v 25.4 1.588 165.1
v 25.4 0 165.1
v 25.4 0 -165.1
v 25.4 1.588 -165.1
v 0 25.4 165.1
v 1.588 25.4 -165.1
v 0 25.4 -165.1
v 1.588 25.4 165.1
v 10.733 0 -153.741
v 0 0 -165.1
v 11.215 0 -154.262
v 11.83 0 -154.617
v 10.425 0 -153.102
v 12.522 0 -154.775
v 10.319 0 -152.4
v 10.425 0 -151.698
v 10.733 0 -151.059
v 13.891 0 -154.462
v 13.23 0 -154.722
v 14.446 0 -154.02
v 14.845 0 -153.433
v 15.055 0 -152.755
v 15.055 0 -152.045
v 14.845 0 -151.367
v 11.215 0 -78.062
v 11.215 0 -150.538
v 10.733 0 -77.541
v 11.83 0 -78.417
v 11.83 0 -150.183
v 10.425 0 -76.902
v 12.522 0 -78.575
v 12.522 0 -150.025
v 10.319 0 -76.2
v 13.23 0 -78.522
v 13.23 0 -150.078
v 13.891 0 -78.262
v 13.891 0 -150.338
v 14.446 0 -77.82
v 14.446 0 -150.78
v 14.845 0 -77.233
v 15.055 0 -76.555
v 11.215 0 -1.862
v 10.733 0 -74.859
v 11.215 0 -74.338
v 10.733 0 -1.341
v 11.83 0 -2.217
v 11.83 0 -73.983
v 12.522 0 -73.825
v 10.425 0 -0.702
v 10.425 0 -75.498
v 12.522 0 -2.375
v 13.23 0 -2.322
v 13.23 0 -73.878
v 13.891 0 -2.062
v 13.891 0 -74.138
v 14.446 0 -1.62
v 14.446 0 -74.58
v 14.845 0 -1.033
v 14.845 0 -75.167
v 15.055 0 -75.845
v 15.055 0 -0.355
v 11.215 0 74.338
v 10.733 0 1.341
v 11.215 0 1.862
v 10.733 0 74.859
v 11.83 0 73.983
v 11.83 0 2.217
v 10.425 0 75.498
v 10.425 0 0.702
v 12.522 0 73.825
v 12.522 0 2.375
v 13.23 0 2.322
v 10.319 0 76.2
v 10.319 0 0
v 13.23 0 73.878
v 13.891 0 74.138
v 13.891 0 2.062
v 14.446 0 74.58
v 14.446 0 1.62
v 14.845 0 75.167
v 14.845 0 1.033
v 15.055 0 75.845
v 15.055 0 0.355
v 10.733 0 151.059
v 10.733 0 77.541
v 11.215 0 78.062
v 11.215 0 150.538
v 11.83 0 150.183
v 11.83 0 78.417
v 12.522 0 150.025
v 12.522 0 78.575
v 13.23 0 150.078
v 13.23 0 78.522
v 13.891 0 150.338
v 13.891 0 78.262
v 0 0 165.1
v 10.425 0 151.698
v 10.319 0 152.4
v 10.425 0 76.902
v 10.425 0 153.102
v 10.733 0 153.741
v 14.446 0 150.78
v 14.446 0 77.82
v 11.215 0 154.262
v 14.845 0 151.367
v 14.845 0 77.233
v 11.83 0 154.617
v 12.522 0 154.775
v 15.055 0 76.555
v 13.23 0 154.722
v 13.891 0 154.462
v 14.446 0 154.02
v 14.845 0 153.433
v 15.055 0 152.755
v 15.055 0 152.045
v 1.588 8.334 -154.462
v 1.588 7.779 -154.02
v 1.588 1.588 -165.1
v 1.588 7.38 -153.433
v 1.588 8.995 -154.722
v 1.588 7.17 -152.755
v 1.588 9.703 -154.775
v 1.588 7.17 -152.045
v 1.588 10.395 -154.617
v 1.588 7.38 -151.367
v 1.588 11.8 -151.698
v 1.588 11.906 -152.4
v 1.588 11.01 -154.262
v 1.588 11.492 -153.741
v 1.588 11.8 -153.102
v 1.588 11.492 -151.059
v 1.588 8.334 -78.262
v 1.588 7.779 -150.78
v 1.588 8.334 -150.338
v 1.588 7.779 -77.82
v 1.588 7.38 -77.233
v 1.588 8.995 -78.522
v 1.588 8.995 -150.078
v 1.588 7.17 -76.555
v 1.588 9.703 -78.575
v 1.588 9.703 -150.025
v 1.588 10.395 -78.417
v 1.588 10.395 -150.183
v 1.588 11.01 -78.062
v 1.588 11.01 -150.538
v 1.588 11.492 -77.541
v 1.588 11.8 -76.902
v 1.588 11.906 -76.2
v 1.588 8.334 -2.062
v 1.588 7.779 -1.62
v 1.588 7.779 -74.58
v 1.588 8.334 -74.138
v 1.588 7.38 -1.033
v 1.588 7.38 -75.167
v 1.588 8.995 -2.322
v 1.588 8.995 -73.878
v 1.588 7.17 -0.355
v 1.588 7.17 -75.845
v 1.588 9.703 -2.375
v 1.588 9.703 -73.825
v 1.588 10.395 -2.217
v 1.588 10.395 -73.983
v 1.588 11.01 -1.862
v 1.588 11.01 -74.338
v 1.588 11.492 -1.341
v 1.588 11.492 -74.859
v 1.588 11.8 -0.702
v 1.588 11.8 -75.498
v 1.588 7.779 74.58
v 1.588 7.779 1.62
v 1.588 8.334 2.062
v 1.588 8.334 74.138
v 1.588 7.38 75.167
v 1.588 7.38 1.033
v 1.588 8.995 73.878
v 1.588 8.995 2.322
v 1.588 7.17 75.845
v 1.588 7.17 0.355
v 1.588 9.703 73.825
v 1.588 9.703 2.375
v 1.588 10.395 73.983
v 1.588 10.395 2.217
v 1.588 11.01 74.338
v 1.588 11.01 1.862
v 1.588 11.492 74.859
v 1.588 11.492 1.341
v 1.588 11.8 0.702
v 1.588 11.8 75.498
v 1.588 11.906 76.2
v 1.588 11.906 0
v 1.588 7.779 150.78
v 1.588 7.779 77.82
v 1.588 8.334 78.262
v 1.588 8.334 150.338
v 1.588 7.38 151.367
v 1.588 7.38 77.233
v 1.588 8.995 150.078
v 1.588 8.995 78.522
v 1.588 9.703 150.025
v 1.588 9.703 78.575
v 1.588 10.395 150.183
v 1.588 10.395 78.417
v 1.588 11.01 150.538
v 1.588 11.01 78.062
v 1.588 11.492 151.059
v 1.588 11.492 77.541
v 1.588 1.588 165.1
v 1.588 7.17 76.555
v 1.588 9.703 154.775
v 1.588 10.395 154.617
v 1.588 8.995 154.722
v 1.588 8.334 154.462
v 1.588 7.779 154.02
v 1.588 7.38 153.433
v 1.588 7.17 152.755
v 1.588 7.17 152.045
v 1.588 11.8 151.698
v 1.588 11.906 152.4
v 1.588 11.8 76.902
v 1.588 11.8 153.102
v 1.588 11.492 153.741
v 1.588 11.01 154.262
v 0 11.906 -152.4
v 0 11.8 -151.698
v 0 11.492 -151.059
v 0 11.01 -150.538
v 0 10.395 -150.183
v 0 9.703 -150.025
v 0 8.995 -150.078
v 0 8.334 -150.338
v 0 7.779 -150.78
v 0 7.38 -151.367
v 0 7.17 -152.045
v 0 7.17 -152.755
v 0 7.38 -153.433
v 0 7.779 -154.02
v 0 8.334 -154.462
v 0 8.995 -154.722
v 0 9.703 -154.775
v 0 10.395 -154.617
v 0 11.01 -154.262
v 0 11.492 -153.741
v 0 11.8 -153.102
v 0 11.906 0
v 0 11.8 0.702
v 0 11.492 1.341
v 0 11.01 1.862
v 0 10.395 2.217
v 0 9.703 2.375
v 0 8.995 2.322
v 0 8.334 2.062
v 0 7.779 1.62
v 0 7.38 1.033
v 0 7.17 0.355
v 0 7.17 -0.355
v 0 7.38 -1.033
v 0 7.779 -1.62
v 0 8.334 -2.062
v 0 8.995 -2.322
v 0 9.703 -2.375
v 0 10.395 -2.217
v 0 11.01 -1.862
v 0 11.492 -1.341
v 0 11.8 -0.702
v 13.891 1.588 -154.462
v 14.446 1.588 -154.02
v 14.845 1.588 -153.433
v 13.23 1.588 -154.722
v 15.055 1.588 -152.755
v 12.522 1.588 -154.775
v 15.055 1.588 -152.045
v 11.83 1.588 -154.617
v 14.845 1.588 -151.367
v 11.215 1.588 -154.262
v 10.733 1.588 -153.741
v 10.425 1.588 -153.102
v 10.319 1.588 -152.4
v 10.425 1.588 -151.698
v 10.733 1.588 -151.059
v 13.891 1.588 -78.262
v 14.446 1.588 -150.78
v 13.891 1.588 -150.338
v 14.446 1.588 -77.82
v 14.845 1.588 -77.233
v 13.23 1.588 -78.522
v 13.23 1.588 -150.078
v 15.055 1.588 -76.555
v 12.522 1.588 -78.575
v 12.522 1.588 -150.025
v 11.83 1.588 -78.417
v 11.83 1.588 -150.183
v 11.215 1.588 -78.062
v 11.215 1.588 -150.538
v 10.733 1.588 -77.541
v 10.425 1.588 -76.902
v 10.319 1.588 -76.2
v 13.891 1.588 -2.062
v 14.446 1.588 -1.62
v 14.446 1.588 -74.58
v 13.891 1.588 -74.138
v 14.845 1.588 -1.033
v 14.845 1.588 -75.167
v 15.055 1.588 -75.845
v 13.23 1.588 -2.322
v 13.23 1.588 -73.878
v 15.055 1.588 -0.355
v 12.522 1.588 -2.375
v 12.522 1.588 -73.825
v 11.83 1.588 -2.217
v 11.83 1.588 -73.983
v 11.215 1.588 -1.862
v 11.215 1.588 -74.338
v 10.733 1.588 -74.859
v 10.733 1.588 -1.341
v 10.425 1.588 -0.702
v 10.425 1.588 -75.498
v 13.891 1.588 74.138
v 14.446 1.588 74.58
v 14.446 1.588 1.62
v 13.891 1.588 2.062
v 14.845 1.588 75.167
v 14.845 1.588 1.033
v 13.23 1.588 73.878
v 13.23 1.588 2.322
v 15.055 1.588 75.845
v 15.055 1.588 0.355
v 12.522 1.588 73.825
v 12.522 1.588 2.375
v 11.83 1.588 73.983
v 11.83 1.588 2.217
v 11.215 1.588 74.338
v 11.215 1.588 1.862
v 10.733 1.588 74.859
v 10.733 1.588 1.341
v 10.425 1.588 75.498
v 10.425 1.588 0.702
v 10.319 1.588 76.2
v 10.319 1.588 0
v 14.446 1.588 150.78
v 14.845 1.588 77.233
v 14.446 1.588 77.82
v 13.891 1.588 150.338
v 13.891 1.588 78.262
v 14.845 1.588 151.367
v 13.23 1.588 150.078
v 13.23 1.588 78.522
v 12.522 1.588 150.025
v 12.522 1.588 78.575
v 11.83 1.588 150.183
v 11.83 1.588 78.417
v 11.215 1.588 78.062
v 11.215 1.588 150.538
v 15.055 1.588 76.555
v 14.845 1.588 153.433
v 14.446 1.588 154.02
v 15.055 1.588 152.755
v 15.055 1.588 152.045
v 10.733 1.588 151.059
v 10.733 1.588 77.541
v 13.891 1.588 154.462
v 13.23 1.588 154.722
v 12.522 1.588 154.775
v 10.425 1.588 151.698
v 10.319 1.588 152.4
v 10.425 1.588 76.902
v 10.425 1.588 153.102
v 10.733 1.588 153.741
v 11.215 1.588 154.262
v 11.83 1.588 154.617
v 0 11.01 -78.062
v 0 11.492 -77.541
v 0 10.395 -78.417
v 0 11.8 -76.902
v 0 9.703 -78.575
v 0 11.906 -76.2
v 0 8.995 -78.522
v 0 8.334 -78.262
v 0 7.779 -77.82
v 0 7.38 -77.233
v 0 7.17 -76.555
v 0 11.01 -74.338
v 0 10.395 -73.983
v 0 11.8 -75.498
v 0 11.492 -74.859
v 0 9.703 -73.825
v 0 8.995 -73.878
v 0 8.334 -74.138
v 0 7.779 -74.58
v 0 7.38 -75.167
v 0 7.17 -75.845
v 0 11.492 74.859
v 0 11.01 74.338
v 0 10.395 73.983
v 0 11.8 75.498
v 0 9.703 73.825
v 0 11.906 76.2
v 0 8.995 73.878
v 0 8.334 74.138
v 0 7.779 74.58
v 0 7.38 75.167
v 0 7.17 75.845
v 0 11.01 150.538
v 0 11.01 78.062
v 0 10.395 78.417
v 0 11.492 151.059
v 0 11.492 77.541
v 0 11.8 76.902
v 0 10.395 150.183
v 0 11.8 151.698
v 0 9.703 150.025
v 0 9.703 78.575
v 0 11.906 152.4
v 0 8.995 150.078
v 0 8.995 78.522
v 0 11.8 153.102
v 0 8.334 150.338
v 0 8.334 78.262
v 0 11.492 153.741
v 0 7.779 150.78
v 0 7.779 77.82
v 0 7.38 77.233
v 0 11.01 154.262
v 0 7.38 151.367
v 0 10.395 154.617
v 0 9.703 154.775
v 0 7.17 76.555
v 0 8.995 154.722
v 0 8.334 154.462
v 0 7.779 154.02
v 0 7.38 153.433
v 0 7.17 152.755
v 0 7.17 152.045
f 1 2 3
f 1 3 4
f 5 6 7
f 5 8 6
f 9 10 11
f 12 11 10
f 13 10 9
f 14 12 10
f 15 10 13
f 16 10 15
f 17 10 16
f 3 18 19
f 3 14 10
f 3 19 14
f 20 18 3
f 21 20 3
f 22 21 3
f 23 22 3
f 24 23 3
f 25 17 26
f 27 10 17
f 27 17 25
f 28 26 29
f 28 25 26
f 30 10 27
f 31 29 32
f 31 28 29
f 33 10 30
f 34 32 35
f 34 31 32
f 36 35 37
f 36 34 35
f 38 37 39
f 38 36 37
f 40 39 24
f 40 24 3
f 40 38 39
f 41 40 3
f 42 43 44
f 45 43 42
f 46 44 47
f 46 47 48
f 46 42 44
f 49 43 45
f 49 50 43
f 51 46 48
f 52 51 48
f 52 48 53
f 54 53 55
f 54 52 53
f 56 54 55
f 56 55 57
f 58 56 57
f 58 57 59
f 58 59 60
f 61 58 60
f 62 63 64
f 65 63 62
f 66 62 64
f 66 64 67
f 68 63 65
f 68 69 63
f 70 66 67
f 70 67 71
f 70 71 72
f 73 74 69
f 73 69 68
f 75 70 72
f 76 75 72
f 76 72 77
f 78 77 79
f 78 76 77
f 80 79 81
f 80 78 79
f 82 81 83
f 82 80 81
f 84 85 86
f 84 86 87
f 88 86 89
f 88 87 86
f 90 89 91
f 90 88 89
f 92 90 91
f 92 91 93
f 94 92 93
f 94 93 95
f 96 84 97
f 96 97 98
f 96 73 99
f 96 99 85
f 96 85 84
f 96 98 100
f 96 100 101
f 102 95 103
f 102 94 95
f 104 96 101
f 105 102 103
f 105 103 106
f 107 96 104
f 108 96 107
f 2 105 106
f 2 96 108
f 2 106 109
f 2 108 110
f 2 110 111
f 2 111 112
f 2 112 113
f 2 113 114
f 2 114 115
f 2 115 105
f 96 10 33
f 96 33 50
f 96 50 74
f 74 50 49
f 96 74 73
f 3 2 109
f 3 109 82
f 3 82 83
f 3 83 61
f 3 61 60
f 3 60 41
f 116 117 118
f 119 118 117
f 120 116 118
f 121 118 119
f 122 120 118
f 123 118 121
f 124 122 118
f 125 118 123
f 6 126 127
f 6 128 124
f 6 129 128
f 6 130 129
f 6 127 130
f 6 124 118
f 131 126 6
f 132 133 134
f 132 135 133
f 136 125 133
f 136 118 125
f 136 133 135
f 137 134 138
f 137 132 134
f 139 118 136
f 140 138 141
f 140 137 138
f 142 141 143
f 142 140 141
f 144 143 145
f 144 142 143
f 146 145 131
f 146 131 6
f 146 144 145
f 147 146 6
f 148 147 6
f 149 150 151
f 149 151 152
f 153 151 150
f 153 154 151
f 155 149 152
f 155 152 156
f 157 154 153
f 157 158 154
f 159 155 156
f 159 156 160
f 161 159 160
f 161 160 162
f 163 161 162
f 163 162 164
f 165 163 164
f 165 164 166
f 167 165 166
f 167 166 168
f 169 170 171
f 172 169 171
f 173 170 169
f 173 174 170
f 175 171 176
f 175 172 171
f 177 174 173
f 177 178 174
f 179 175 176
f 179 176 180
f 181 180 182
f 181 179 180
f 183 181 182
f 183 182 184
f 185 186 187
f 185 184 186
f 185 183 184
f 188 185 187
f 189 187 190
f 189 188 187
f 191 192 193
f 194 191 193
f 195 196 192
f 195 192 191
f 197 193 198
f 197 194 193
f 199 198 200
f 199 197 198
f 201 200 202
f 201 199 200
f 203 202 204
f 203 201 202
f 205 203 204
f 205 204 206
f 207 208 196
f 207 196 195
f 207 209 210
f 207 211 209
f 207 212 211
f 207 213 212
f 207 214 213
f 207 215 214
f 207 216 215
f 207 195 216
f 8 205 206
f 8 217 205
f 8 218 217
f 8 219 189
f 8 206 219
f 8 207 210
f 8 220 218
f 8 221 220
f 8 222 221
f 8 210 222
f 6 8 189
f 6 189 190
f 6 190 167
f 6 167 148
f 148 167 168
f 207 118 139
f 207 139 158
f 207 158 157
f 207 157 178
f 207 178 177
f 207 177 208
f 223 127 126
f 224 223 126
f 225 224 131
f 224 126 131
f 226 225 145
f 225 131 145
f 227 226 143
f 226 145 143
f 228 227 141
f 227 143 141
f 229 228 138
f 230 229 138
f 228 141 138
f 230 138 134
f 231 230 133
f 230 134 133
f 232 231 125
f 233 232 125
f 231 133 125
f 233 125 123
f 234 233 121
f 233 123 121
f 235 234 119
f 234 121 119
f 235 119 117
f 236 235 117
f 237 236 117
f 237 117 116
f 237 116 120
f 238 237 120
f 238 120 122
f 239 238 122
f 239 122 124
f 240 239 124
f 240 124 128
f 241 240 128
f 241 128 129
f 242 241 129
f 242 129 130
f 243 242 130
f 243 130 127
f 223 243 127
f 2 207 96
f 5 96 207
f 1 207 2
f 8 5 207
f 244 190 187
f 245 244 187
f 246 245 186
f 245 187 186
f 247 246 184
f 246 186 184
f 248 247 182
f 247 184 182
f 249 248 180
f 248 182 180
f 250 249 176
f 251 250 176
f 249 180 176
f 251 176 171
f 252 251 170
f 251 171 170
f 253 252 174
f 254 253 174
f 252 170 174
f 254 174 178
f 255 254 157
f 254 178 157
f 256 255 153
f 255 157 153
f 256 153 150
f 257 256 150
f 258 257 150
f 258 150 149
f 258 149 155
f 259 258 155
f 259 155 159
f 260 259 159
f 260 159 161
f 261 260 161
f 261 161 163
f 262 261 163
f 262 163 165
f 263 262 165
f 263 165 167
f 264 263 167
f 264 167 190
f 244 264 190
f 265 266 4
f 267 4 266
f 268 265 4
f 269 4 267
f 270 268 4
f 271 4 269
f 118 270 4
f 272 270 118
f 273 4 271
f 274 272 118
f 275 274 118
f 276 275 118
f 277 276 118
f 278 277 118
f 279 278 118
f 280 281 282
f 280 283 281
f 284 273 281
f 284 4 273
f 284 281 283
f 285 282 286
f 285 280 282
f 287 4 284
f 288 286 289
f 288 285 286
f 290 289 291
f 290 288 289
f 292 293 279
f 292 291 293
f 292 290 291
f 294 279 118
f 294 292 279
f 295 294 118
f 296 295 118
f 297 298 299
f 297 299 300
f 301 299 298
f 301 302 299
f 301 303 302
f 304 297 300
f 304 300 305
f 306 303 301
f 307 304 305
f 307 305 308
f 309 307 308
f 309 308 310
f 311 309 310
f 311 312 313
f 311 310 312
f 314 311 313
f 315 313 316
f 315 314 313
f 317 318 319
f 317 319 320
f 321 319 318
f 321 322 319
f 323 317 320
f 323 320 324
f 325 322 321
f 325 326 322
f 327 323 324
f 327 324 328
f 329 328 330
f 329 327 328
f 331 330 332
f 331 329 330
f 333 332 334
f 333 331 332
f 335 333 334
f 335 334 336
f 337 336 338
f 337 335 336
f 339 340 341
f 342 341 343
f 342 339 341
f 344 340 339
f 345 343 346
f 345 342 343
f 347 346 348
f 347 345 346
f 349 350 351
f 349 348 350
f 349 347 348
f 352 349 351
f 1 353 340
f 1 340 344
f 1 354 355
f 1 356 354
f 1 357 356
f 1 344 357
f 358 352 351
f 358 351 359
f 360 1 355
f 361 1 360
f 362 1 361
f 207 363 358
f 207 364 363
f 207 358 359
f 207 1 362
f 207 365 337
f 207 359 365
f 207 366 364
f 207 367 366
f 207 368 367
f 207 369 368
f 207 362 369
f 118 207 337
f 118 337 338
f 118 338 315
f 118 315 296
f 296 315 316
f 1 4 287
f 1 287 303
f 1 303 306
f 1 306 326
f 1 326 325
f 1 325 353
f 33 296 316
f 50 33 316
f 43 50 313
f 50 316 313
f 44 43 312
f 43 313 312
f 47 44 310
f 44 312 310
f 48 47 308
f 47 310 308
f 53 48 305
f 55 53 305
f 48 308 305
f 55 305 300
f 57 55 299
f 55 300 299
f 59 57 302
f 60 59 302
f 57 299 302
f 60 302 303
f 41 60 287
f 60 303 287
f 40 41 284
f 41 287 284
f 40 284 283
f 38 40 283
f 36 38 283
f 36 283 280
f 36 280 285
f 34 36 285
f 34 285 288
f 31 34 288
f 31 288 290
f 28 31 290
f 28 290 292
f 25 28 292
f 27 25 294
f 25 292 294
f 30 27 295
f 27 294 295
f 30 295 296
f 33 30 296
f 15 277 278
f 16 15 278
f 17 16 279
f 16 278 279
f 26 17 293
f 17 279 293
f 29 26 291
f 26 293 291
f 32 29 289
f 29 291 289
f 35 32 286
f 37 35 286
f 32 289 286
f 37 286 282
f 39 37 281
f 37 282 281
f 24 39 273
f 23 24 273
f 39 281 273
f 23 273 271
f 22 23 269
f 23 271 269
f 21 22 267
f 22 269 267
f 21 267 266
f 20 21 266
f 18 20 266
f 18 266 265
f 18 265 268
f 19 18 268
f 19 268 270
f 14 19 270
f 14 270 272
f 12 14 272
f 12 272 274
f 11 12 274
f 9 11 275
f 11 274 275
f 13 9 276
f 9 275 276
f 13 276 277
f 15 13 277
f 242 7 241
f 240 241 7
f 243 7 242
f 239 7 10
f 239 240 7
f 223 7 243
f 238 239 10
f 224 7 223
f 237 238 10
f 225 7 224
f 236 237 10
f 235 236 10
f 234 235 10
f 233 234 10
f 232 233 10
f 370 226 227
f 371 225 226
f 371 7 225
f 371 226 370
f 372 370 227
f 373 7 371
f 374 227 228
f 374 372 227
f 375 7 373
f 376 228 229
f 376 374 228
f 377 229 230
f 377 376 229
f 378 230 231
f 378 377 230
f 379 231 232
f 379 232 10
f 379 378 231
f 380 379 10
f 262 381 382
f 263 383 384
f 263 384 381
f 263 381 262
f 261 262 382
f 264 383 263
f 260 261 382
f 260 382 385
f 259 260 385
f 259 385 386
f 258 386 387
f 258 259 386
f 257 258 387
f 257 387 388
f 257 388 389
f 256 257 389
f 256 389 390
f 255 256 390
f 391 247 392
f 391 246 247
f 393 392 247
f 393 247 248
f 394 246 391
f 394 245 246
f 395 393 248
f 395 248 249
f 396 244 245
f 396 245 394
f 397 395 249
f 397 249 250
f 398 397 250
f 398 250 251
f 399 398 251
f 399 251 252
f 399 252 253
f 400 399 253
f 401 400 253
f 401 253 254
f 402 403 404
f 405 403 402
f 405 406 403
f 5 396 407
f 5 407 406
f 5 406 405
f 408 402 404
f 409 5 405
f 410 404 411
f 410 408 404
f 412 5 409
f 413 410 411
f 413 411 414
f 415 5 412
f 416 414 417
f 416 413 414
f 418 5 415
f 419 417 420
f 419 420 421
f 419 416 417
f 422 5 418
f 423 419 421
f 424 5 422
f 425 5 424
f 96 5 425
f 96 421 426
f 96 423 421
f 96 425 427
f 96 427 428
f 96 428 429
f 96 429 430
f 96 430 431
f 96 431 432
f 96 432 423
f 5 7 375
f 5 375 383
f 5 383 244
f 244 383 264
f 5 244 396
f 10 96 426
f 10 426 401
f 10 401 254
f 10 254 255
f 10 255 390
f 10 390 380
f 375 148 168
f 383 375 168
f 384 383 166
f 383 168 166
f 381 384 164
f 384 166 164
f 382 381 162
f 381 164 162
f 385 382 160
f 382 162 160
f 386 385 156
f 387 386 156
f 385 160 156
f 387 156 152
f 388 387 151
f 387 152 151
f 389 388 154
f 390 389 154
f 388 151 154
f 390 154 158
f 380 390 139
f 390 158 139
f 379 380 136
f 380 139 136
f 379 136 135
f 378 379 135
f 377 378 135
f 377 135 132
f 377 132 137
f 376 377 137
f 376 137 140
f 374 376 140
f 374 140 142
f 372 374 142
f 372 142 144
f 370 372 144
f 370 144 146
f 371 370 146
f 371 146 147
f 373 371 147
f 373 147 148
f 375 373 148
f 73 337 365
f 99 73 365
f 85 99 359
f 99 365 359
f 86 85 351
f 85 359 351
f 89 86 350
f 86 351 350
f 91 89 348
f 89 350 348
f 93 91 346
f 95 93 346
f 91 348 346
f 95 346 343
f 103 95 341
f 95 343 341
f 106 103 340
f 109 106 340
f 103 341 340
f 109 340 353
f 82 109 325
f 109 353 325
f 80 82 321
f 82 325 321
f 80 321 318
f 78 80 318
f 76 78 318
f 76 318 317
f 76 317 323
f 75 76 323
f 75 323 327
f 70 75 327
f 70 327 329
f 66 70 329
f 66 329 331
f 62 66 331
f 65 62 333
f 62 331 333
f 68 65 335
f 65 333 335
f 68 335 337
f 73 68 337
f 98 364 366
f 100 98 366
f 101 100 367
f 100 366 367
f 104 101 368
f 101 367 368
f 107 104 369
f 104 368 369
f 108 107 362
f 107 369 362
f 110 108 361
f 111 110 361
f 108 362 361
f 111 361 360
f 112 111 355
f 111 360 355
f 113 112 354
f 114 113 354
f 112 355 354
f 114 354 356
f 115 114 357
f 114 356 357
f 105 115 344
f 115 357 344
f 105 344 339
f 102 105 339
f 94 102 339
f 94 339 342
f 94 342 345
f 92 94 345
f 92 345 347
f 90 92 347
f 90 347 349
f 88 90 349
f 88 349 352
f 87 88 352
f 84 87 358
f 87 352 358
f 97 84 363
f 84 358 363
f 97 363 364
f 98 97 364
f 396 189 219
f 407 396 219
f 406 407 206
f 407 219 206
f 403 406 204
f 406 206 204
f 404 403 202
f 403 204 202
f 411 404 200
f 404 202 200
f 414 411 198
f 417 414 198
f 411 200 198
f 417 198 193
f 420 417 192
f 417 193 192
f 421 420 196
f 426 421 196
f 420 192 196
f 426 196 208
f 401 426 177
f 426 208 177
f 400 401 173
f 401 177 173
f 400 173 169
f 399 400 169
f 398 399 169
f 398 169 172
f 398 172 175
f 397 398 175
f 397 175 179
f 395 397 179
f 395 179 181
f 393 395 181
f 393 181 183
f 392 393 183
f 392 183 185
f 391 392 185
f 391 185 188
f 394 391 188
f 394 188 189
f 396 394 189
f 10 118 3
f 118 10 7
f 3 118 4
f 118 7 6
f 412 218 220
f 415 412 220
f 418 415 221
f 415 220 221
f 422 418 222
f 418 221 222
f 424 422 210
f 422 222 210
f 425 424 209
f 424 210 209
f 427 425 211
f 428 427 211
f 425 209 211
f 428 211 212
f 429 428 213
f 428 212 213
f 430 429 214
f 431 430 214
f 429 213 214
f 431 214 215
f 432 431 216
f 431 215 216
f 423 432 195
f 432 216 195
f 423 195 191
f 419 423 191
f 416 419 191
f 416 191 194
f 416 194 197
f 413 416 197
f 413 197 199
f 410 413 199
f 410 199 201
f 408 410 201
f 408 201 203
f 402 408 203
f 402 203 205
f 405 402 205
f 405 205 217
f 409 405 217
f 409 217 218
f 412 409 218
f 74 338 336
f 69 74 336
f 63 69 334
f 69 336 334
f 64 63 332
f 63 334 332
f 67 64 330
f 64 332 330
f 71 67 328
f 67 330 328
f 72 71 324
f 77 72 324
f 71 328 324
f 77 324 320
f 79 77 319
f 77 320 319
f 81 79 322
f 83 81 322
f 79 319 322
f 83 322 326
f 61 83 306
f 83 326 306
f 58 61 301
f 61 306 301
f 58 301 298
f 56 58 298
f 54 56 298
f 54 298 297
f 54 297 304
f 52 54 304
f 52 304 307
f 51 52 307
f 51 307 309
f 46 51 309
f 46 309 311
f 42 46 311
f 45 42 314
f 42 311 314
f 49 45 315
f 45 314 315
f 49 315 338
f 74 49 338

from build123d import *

# Parameters (mm, degrees)
F1_DEPTH = 165.1
F2_R     = 2.38125
F3_DEPTH = 1.5875
F4_R     = 2.38125
F5_DEPTH = 25.4


with BuildPart() as f1:
    # F0 (on Top) → F1 (new body, symmetric)
    with BuildSketch(Plane.XY):
        Polygon((1.5875, 25.4), (0, 25.4), (0, 0), (25.4, 0), (25.4, 1.5875), (1.5875, 1.5875), align=None)
    extrude(amount=F1_DEPTH, both=True)

    # F2 (on face) → F3 (cut, through all)
    with BuildSketch(Plane(origin=(0, 1.5875, 0), x_dir=(-1, 0, 0), z_dir=(0, 1, 0))):
        with Locations((-12.7, -152.4)):
            Circle(F2_R)
        with Locations((-12.7, 152.4)):
            Circle(F2_R)
        with Locations((-12.7, 76.2)):
            Circle(F2_R)
        with Locations((-12.7, -76.2)):
            Circle(F2_R)
        with Locations((-12.7, 0)):
            Circle(F2_R)
    extrude(amount=-F3_DEPTH, mode=Mode.SUBTRACT)

    # F4 (on face) → F5 (cut)
    with BuildSketch(Plane.YZ.offset(1.5875)):
        with Locations((9.525, -152.4)):
            Circle(F4_R)
        with Locations((9.525, -76.2)):
            Circle(F4_R)
        with Locations((9.525, 0)):
            Circle(F4_R)
        with Locations((9.525, 76.2)):
            Circle(F4_R)
        with Locations((9.525, 152.4)):
            Circle(F4_R)
    extrude(amount=-F5_DEPTH, mode=Mode.SUBTRACT)


solid = f1.part
